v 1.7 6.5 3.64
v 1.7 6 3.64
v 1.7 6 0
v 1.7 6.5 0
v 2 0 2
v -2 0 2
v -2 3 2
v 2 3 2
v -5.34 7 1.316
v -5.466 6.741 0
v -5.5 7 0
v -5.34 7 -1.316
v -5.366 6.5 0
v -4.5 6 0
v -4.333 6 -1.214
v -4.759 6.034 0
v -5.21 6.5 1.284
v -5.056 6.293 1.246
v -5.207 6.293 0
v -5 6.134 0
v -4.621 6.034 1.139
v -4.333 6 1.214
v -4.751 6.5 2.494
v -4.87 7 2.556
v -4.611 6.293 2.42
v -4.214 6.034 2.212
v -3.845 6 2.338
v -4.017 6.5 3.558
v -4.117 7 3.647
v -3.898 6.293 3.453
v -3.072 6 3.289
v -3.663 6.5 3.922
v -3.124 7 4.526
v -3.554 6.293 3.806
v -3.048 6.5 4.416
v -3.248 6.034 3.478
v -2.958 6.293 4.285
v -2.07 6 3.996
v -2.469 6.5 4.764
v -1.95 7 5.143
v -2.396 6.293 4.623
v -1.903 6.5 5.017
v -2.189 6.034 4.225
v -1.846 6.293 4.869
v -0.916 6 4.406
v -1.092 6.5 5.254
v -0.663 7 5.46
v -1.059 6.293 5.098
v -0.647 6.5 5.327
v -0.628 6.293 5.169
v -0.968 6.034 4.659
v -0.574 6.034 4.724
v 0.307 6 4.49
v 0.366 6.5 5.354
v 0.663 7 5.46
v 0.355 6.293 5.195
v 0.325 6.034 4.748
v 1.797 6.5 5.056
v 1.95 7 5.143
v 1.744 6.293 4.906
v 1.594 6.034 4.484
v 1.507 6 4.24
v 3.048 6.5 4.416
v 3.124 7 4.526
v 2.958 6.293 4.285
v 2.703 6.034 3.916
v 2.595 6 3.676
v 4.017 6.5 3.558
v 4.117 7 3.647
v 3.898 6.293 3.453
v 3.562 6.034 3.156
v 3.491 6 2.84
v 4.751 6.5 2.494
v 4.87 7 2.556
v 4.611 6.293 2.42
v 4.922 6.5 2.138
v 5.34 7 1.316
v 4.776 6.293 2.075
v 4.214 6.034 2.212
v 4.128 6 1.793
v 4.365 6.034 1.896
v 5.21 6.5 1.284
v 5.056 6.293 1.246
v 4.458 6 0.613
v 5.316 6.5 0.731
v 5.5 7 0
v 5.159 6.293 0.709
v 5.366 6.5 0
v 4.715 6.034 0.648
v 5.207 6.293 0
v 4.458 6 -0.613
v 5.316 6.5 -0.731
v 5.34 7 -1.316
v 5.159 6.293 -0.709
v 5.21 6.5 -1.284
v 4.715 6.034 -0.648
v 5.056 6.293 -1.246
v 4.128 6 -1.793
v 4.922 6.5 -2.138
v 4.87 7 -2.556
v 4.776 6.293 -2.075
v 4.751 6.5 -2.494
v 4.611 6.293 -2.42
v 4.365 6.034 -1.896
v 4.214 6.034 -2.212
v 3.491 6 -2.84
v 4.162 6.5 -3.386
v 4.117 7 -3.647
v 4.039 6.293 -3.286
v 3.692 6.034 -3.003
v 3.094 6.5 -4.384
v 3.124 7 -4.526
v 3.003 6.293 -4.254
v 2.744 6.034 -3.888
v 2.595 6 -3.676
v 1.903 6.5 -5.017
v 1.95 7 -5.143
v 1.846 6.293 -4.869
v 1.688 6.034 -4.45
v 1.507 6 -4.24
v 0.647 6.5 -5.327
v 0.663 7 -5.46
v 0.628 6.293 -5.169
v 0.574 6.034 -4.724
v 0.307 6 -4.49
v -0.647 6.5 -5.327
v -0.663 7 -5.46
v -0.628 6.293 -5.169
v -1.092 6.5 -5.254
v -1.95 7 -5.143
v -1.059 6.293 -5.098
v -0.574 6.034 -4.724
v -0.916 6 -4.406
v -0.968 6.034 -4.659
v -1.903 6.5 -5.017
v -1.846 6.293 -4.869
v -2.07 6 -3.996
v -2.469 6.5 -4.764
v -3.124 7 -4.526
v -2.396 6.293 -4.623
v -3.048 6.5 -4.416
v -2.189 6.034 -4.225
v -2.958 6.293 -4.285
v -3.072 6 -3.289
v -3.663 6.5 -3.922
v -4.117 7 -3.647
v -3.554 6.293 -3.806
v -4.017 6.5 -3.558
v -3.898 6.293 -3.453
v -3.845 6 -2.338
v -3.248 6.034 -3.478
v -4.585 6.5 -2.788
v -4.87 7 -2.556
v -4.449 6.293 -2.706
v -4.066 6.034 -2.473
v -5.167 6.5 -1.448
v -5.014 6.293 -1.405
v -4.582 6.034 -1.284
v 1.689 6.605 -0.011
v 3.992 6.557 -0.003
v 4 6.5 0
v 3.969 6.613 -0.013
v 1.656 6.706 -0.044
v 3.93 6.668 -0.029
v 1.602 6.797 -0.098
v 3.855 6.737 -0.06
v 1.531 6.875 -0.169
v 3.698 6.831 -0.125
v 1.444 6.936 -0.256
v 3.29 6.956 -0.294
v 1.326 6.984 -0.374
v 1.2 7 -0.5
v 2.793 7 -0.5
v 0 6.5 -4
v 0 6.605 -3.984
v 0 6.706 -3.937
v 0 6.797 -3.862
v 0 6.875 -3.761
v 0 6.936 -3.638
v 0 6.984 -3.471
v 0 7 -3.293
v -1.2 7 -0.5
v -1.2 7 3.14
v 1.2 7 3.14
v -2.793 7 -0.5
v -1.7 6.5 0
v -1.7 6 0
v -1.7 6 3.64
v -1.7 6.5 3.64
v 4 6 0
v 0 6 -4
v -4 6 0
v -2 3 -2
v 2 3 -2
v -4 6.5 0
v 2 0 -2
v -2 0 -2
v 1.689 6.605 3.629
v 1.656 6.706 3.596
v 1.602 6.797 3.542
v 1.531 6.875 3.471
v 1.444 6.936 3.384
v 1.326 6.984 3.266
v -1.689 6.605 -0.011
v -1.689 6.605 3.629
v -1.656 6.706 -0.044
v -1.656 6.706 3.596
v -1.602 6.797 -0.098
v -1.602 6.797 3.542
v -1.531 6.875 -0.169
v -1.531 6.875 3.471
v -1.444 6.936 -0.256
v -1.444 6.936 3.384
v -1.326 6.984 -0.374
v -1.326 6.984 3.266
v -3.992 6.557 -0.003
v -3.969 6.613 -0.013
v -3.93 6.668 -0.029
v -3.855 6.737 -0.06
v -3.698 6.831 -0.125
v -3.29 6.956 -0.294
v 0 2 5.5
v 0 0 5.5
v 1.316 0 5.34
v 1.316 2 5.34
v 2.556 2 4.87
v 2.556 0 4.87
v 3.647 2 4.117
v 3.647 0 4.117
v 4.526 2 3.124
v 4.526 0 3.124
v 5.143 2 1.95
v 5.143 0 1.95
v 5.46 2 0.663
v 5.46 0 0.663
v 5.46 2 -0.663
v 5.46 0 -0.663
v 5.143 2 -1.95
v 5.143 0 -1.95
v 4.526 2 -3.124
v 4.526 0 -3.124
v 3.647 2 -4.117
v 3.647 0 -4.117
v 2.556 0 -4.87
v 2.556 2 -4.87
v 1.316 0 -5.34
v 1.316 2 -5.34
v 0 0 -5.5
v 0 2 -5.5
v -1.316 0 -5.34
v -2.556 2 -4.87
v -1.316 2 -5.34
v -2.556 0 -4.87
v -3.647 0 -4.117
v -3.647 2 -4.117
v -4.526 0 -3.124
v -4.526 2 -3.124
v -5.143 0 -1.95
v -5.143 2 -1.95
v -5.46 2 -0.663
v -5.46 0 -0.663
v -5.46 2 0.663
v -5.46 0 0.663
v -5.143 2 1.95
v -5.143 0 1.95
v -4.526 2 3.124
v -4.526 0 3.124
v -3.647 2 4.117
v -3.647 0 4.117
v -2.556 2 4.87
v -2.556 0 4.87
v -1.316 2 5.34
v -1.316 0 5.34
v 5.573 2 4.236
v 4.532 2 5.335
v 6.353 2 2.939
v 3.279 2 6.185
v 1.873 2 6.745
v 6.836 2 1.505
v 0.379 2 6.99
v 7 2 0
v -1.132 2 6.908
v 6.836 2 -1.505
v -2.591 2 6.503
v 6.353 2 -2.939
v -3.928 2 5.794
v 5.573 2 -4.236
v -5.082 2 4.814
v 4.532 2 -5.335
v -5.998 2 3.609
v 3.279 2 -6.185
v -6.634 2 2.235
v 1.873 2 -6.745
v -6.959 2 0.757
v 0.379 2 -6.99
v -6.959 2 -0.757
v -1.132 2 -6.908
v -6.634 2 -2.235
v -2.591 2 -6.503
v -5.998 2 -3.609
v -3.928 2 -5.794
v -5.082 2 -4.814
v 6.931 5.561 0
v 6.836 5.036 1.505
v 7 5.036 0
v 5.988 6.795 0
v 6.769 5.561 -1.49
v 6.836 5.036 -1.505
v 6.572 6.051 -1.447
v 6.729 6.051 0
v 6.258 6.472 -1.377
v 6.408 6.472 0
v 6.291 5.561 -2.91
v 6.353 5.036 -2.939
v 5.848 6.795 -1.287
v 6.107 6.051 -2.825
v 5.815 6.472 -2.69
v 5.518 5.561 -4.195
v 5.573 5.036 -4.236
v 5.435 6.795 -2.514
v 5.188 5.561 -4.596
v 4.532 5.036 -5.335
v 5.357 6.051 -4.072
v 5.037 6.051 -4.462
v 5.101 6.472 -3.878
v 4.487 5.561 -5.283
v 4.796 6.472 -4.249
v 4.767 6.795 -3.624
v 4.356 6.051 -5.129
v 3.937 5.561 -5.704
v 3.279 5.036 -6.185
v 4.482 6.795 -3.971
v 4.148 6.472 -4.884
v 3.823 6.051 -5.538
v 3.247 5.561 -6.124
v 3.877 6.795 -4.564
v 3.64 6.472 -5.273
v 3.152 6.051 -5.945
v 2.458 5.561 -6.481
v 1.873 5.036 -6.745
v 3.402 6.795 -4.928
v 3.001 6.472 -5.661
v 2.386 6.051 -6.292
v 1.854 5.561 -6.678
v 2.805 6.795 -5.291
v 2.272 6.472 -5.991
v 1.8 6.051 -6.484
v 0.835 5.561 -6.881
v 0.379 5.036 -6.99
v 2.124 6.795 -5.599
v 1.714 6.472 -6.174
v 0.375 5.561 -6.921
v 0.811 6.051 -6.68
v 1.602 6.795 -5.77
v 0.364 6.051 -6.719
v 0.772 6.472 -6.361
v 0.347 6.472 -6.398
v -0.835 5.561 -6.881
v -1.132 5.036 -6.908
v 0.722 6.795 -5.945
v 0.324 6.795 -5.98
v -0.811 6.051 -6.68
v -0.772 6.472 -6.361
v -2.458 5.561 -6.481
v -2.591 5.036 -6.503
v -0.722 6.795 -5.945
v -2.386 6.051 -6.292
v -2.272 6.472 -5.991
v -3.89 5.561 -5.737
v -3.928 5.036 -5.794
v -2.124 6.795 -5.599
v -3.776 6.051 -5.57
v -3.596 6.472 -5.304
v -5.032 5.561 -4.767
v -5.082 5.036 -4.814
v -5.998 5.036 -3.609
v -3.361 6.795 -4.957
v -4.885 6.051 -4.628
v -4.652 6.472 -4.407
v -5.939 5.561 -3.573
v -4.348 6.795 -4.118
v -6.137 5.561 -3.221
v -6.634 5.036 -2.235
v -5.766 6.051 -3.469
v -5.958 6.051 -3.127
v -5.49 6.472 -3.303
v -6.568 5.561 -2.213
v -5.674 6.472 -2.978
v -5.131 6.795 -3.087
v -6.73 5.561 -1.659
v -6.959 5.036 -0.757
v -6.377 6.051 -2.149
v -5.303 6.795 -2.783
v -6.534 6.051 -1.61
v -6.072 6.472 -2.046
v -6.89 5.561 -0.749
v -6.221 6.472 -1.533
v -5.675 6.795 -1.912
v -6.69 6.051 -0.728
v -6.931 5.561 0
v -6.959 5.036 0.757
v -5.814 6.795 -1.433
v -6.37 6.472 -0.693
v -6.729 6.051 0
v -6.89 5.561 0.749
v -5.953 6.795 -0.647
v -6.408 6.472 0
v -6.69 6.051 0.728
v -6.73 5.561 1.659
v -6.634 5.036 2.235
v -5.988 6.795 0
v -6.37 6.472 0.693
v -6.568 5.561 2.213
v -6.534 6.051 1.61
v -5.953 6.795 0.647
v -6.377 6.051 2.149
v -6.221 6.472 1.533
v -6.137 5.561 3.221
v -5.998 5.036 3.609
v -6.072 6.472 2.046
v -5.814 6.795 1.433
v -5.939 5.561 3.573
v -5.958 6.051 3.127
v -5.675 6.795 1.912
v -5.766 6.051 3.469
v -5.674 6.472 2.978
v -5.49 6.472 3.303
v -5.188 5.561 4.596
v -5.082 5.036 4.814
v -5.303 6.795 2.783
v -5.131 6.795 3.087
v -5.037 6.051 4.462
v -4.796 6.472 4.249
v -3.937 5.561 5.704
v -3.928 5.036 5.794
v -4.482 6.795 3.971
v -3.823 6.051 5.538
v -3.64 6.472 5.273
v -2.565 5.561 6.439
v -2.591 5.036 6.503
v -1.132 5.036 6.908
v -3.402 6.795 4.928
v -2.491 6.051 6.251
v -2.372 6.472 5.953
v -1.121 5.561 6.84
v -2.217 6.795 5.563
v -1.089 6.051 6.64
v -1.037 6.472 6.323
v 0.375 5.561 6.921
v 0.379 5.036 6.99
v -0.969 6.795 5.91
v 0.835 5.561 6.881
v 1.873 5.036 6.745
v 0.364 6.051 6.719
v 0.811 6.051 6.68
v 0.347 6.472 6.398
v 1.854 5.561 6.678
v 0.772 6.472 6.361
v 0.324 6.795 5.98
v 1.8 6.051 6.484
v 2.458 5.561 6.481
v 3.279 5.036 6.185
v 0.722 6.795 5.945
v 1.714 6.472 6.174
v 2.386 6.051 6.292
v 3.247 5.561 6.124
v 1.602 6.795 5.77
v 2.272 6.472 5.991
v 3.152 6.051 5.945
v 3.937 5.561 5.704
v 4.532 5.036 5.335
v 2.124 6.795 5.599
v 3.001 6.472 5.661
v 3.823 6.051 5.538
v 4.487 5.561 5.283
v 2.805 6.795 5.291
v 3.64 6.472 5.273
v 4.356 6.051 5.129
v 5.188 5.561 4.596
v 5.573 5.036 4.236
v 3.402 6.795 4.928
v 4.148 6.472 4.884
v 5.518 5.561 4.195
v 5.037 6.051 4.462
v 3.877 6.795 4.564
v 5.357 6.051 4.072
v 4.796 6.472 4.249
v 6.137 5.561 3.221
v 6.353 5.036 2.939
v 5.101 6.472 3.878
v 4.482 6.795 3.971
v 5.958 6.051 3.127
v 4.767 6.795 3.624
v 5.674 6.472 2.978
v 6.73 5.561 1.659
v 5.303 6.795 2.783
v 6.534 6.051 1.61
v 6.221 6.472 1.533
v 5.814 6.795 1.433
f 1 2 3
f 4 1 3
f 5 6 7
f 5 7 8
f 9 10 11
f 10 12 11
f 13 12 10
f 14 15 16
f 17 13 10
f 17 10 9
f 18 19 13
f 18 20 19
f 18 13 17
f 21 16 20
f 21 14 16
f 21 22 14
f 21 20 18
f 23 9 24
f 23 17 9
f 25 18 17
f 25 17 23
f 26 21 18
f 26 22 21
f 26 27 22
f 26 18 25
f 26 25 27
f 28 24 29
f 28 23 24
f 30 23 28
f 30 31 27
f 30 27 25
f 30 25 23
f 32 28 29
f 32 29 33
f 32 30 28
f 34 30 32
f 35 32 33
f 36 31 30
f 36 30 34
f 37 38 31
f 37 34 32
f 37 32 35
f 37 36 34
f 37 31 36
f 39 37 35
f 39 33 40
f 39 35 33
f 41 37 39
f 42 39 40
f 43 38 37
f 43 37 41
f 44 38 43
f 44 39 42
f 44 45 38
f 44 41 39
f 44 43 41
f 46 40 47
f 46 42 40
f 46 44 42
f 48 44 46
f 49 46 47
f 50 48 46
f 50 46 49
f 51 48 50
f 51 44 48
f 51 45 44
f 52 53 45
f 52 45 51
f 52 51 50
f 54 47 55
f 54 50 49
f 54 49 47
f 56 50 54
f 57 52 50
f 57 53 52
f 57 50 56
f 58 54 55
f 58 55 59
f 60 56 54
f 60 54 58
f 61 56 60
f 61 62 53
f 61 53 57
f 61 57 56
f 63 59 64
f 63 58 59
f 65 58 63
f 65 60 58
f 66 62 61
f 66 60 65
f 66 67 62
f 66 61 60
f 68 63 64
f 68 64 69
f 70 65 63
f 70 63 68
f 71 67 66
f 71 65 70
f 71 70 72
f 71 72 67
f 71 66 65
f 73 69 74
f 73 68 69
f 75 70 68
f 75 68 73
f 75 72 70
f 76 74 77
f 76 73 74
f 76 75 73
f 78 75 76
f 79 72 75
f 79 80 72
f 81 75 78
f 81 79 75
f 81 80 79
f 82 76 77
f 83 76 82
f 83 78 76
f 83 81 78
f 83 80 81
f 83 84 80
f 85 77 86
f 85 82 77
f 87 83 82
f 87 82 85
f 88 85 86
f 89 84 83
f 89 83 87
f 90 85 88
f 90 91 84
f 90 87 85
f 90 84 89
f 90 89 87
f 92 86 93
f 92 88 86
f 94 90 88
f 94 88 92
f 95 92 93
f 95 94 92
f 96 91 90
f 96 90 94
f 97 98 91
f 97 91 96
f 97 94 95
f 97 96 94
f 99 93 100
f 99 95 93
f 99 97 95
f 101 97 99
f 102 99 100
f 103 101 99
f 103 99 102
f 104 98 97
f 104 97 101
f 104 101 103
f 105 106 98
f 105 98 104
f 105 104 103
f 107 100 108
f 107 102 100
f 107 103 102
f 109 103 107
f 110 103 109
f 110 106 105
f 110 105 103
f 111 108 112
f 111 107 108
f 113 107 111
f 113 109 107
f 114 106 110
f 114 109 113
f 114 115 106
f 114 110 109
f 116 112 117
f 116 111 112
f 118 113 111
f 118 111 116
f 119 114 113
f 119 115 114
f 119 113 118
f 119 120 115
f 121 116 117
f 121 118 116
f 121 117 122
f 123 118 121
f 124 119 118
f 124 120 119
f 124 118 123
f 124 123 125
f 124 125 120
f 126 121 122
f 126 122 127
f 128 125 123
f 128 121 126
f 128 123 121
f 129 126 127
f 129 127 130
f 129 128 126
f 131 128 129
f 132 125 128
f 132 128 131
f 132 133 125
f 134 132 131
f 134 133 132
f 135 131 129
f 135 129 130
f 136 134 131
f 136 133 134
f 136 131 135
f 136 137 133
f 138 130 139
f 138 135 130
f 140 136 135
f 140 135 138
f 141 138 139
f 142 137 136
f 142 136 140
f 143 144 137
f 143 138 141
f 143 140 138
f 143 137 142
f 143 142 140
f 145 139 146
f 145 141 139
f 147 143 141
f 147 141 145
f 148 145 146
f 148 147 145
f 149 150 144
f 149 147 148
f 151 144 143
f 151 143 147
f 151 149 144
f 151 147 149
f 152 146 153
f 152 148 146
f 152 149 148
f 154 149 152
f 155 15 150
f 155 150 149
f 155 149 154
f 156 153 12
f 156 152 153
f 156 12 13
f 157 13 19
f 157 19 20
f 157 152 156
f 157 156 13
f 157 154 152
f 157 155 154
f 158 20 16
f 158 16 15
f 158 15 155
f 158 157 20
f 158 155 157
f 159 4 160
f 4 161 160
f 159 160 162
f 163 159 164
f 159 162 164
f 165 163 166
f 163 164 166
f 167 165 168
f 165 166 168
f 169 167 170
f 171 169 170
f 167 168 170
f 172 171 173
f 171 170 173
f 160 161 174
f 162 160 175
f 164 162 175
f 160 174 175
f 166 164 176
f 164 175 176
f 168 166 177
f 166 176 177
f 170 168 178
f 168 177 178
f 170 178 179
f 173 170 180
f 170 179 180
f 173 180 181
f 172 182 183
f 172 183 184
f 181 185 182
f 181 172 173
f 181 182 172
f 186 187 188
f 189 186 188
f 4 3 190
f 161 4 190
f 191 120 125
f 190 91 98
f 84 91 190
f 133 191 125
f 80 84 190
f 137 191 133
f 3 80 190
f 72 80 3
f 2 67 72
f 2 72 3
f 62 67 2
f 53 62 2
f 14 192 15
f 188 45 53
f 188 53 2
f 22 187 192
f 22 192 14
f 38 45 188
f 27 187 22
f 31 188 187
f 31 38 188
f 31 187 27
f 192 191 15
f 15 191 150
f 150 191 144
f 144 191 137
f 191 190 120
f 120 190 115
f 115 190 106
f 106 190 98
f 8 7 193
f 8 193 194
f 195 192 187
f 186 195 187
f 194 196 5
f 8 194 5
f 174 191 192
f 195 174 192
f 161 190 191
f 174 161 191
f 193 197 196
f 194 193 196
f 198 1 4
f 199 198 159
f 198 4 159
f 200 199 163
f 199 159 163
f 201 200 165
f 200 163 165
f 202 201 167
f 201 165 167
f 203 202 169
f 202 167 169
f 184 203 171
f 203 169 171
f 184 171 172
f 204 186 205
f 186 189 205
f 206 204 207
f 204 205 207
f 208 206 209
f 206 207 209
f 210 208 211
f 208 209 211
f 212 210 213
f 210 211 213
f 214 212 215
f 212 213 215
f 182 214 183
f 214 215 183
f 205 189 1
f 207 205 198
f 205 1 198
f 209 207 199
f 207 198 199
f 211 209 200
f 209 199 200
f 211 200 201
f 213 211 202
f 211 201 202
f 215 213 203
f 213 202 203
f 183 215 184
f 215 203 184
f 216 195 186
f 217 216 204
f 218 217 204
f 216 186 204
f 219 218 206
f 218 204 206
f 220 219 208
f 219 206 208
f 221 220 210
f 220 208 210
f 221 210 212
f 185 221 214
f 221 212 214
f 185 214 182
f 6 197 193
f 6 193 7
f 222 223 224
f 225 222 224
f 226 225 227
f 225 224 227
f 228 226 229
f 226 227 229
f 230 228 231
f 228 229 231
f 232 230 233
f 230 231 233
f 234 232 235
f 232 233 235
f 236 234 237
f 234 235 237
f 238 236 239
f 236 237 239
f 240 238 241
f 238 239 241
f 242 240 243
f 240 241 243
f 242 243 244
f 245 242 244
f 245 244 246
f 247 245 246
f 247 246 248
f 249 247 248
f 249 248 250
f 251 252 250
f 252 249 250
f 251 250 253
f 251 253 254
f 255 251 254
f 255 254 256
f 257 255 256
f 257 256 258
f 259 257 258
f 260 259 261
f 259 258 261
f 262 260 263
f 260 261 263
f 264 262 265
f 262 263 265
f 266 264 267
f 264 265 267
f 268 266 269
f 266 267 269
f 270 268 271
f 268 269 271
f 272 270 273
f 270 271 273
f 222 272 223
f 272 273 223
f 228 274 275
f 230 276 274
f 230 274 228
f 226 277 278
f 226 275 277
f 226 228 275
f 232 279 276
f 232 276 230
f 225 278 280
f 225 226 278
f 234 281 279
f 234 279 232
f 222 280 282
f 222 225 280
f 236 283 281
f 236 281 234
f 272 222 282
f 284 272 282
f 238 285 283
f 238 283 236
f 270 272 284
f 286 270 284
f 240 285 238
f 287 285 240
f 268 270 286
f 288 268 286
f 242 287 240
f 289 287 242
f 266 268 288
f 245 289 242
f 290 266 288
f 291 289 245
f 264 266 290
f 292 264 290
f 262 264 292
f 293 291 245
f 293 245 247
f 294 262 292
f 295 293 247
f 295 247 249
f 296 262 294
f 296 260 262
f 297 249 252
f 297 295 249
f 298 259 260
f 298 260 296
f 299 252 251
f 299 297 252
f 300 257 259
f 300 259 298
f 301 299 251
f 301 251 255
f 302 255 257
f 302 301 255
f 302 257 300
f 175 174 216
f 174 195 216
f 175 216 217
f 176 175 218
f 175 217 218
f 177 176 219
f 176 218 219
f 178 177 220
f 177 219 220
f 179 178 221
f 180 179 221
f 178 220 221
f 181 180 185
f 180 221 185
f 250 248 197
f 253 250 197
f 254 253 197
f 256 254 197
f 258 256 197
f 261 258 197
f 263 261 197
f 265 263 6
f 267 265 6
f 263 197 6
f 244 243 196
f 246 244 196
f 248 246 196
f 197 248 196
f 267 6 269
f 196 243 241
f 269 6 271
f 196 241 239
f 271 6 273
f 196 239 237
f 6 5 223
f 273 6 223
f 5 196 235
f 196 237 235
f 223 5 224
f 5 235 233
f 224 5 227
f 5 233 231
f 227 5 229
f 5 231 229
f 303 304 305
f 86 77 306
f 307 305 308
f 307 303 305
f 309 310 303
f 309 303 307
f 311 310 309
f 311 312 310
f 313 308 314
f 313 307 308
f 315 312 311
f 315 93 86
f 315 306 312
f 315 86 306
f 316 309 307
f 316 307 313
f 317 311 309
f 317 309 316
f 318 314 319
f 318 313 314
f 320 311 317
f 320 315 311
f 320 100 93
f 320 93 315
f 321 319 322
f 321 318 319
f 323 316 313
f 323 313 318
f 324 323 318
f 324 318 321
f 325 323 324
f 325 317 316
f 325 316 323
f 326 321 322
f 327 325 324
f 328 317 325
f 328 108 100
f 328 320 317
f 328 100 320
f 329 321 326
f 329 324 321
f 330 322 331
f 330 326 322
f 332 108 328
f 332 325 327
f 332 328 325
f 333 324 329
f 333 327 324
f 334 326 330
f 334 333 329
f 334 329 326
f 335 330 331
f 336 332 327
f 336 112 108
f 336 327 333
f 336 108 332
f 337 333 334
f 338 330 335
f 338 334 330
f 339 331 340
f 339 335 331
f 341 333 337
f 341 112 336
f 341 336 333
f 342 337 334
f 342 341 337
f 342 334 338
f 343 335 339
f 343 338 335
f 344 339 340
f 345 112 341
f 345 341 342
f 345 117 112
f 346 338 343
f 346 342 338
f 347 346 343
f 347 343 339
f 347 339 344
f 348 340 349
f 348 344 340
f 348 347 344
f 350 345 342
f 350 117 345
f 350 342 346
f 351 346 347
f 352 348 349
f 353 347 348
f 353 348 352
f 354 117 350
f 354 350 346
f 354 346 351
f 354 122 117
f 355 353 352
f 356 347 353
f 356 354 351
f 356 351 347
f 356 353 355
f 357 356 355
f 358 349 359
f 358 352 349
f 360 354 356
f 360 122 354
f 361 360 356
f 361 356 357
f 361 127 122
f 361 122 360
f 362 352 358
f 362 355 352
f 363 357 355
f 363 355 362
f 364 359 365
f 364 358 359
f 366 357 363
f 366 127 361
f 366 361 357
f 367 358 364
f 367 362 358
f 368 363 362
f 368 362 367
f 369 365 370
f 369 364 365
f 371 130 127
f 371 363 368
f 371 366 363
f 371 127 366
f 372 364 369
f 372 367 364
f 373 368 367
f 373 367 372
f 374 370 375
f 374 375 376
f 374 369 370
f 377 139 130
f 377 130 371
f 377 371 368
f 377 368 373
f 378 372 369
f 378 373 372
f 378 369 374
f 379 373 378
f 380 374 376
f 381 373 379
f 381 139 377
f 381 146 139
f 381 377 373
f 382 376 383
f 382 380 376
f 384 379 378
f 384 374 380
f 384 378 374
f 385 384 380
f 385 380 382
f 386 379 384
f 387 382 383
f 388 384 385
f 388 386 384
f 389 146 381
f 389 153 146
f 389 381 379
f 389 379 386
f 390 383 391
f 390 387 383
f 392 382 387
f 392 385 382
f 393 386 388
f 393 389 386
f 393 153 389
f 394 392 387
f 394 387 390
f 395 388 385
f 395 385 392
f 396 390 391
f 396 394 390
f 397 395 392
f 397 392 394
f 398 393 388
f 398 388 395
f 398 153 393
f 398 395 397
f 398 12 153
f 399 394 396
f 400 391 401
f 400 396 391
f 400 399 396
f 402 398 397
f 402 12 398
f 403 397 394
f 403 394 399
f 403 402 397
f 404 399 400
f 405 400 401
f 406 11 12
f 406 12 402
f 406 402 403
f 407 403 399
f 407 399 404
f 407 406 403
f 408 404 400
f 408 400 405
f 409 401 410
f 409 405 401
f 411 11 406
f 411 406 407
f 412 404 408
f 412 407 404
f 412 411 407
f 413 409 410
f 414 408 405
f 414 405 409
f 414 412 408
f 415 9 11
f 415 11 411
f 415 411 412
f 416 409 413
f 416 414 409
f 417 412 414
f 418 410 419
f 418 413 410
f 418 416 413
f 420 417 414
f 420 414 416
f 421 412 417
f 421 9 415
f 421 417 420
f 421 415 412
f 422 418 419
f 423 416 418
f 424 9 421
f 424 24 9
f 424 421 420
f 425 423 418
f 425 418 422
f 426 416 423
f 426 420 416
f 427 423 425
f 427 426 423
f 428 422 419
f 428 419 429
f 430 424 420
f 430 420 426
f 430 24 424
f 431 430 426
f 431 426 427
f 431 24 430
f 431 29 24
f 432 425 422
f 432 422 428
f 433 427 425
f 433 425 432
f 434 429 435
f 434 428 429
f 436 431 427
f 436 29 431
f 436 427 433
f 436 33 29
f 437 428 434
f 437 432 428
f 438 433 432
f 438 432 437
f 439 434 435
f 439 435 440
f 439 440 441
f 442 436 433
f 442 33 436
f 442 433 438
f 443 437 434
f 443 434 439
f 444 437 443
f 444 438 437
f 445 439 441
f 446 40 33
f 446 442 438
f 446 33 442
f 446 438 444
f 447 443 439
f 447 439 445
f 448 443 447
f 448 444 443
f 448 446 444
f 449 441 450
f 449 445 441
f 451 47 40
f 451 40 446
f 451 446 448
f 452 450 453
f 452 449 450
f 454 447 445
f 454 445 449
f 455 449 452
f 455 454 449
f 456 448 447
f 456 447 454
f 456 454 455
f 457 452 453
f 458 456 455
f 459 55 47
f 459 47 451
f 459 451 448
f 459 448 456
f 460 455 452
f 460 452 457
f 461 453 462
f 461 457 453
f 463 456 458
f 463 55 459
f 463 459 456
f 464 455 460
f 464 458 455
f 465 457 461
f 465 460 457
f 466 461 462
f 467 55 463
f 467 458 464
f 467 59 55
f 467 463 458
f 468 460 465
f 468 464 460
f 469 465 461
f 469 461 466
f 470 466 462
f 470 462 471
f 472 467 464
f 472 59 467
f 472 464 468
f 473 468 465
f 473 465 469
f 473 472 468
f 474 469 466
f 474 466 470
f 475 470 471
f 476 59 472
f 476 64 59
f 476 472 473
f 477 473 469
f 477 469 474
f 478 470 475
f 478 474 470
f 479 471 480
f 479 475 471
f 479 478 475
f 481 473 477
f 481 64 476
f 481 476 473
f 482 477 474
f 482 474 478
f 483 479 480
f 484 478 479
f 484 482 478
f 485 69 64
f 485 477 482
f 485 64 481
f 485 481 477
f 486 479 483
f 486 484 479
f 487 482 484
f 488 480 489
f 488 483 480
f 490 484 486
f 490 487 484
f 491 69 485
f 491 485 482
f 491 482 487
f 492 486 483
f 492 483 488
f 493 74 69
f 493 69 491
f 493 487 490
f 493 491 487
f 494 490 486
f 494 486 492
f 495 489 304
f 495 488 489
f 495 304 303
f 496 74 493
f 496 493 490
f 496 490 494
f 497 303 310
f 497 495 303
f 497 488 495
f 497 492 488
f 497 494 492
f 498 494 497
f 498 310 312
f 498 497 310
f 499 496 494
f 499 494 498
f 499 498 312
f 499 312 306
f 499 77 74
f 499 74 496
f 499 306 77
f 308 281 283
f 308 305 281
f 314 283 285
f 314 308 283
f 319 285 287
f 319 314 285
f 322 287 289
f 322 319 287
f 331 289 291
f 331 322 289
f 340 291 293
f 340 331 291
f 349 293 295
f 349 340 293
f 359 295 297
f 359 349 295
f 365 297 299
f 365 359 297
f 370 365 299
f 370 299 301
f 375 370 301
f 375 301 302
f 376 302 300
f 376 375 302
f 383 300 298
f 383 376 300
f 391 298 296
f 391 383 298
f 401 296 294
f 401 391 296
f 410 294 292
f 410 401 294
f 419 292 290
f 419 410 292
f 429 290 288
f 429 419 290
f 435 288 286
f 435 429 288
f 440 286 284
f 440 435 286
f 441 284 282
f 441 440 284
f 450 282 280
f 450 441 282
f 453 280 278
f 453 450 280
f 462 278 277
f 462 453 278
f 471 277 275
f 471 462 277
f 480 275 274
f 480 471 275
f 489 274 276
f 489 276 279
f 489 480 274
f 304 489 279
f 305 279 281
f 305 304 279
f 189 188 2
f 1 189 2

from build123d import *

# Parameters (mm, degrees)
SKETCH_1_R          = 5.5
EXTRUDE_1_DEPTH     = 7
CUT_EXTRUDE_START   = -1
SKETCH_2_R          = 5.5
CUT_EXTRUDE_1_DEPTH = 1
EXTRUDE_2_DEPTH     = 1
SKETCH_5_W          = 4
SKETCH_5_H          = 4
CUT_EXTRUDE_2_DEPTH = 3
FILLET_3_R          = 1
FILLET_4_R          = 0.5


with BuildPart() as part:
    # Эскиз1 → Бобышка-Вытянуть1 (new body)
    with BuildSketch(Plane(origin=(0, 0, 0), x_dir=(1, 0, 0), z_dir=(0, 1, 0))):
        with Locations(Location((0, 0, 0), (0, 0, 270))):
            Circle(SKETCH_1_R)
    extrude(amount=EXTRUDE_1_DEPTH)

    # Эскиз6 → Повернуть3 (revolve)
    with BuildSketch(Plane.XY, mode=Mode.PRIVATE) as revolve_3_sk:
        with BuildLine():
            Line((-4.665230635, 2), (-7, 2))
            Line((-7, 2), (-7, 3))
            Line((-7, 3), (-7, 5.035898385))
            ThreePointArc((-7, 5.035898385), (-6.582112259, 6.271585962), (-5.5, 7))
            Line((-5.5, 7), (-4.665230635, 7))
            Line((-4.665230635, 7), (-4.665230635, 3))
            Line((-4.665230635, 3), (-4.665230635, 2))
        make_face()
    revolve(revolve_3_sk.sketch.rotate(Axis((0, -1000, 0), (0, 1, 0)), 180), axis=Axis((0, -1000, 0), (0, 1, 0)))

    # Эскиз2 → Вырез-Вытянуть1 (cut)
    with BuildSketch(Plane(origin=(0, 7, 0), x_dir=(1, 0, 0), z_dir=(0, 1, 0)).offset(CUT_EXTRUDE_START)):
        with Locations(Location((0, 0, 0), (0, 0, 180))):
            Circle(SKETCH_2_R)
    extrude(amount=CUT_EXTRUDE_1_DEPTH, mode=Mode.SUBTRACT)

    # Эскиз3 → Бобышка-Вытянуть2 (add)
    with BuildSketch(Plane(origin=(0, 6, 0), x_dir=(1, 0, 0), z_dir=(0, 1, 0))):
        Polygon((0, 4), (-4, 0), (-1.7, 0), (-1.7, -3.640107036), (1.7, -3.640107036), (1.7, 0), (4, 0), align=None)
    extrude(amount=EXTRUDE_2_DEPTH)

    # Эскиз5 → Вырез-Вытянуть2 (cut)
    with BuildSketch(Plane.XZ):
        Rectangle(SKETCH_5_W, SKETCH_5_H)
    extrude(amount=-CUT_EXTRUDE_2_DEPTH, mode=Mode.SUBTRACT)

    # Скругление3
    fillet_3_edges = [part.edges().sort_by_distance(p)[0] for p in [
        (5.5, 6, 0),
    ]]
    fillet(fillet_3_edges, radius=FILLET_3_R - 0.0001)  # a hair under: the kernel refuses the full size

    # Скругление4
    fillet_4_edges = [part.edges().sort_by_distance(p)[0] for p in [
        (2, 7, -2),
        (-2, 7, -2),
        (-2.85, 7, 0),
        (-1.7, 7, 1.820053518),
        (0, 7, 3.640107036),
        (1.7, 7, 1.820053518),
        (2.85, 7, 0),
    ]]
    fillet(fillet_4_edges, radius=FILLET_4_R)


solid = part.part
